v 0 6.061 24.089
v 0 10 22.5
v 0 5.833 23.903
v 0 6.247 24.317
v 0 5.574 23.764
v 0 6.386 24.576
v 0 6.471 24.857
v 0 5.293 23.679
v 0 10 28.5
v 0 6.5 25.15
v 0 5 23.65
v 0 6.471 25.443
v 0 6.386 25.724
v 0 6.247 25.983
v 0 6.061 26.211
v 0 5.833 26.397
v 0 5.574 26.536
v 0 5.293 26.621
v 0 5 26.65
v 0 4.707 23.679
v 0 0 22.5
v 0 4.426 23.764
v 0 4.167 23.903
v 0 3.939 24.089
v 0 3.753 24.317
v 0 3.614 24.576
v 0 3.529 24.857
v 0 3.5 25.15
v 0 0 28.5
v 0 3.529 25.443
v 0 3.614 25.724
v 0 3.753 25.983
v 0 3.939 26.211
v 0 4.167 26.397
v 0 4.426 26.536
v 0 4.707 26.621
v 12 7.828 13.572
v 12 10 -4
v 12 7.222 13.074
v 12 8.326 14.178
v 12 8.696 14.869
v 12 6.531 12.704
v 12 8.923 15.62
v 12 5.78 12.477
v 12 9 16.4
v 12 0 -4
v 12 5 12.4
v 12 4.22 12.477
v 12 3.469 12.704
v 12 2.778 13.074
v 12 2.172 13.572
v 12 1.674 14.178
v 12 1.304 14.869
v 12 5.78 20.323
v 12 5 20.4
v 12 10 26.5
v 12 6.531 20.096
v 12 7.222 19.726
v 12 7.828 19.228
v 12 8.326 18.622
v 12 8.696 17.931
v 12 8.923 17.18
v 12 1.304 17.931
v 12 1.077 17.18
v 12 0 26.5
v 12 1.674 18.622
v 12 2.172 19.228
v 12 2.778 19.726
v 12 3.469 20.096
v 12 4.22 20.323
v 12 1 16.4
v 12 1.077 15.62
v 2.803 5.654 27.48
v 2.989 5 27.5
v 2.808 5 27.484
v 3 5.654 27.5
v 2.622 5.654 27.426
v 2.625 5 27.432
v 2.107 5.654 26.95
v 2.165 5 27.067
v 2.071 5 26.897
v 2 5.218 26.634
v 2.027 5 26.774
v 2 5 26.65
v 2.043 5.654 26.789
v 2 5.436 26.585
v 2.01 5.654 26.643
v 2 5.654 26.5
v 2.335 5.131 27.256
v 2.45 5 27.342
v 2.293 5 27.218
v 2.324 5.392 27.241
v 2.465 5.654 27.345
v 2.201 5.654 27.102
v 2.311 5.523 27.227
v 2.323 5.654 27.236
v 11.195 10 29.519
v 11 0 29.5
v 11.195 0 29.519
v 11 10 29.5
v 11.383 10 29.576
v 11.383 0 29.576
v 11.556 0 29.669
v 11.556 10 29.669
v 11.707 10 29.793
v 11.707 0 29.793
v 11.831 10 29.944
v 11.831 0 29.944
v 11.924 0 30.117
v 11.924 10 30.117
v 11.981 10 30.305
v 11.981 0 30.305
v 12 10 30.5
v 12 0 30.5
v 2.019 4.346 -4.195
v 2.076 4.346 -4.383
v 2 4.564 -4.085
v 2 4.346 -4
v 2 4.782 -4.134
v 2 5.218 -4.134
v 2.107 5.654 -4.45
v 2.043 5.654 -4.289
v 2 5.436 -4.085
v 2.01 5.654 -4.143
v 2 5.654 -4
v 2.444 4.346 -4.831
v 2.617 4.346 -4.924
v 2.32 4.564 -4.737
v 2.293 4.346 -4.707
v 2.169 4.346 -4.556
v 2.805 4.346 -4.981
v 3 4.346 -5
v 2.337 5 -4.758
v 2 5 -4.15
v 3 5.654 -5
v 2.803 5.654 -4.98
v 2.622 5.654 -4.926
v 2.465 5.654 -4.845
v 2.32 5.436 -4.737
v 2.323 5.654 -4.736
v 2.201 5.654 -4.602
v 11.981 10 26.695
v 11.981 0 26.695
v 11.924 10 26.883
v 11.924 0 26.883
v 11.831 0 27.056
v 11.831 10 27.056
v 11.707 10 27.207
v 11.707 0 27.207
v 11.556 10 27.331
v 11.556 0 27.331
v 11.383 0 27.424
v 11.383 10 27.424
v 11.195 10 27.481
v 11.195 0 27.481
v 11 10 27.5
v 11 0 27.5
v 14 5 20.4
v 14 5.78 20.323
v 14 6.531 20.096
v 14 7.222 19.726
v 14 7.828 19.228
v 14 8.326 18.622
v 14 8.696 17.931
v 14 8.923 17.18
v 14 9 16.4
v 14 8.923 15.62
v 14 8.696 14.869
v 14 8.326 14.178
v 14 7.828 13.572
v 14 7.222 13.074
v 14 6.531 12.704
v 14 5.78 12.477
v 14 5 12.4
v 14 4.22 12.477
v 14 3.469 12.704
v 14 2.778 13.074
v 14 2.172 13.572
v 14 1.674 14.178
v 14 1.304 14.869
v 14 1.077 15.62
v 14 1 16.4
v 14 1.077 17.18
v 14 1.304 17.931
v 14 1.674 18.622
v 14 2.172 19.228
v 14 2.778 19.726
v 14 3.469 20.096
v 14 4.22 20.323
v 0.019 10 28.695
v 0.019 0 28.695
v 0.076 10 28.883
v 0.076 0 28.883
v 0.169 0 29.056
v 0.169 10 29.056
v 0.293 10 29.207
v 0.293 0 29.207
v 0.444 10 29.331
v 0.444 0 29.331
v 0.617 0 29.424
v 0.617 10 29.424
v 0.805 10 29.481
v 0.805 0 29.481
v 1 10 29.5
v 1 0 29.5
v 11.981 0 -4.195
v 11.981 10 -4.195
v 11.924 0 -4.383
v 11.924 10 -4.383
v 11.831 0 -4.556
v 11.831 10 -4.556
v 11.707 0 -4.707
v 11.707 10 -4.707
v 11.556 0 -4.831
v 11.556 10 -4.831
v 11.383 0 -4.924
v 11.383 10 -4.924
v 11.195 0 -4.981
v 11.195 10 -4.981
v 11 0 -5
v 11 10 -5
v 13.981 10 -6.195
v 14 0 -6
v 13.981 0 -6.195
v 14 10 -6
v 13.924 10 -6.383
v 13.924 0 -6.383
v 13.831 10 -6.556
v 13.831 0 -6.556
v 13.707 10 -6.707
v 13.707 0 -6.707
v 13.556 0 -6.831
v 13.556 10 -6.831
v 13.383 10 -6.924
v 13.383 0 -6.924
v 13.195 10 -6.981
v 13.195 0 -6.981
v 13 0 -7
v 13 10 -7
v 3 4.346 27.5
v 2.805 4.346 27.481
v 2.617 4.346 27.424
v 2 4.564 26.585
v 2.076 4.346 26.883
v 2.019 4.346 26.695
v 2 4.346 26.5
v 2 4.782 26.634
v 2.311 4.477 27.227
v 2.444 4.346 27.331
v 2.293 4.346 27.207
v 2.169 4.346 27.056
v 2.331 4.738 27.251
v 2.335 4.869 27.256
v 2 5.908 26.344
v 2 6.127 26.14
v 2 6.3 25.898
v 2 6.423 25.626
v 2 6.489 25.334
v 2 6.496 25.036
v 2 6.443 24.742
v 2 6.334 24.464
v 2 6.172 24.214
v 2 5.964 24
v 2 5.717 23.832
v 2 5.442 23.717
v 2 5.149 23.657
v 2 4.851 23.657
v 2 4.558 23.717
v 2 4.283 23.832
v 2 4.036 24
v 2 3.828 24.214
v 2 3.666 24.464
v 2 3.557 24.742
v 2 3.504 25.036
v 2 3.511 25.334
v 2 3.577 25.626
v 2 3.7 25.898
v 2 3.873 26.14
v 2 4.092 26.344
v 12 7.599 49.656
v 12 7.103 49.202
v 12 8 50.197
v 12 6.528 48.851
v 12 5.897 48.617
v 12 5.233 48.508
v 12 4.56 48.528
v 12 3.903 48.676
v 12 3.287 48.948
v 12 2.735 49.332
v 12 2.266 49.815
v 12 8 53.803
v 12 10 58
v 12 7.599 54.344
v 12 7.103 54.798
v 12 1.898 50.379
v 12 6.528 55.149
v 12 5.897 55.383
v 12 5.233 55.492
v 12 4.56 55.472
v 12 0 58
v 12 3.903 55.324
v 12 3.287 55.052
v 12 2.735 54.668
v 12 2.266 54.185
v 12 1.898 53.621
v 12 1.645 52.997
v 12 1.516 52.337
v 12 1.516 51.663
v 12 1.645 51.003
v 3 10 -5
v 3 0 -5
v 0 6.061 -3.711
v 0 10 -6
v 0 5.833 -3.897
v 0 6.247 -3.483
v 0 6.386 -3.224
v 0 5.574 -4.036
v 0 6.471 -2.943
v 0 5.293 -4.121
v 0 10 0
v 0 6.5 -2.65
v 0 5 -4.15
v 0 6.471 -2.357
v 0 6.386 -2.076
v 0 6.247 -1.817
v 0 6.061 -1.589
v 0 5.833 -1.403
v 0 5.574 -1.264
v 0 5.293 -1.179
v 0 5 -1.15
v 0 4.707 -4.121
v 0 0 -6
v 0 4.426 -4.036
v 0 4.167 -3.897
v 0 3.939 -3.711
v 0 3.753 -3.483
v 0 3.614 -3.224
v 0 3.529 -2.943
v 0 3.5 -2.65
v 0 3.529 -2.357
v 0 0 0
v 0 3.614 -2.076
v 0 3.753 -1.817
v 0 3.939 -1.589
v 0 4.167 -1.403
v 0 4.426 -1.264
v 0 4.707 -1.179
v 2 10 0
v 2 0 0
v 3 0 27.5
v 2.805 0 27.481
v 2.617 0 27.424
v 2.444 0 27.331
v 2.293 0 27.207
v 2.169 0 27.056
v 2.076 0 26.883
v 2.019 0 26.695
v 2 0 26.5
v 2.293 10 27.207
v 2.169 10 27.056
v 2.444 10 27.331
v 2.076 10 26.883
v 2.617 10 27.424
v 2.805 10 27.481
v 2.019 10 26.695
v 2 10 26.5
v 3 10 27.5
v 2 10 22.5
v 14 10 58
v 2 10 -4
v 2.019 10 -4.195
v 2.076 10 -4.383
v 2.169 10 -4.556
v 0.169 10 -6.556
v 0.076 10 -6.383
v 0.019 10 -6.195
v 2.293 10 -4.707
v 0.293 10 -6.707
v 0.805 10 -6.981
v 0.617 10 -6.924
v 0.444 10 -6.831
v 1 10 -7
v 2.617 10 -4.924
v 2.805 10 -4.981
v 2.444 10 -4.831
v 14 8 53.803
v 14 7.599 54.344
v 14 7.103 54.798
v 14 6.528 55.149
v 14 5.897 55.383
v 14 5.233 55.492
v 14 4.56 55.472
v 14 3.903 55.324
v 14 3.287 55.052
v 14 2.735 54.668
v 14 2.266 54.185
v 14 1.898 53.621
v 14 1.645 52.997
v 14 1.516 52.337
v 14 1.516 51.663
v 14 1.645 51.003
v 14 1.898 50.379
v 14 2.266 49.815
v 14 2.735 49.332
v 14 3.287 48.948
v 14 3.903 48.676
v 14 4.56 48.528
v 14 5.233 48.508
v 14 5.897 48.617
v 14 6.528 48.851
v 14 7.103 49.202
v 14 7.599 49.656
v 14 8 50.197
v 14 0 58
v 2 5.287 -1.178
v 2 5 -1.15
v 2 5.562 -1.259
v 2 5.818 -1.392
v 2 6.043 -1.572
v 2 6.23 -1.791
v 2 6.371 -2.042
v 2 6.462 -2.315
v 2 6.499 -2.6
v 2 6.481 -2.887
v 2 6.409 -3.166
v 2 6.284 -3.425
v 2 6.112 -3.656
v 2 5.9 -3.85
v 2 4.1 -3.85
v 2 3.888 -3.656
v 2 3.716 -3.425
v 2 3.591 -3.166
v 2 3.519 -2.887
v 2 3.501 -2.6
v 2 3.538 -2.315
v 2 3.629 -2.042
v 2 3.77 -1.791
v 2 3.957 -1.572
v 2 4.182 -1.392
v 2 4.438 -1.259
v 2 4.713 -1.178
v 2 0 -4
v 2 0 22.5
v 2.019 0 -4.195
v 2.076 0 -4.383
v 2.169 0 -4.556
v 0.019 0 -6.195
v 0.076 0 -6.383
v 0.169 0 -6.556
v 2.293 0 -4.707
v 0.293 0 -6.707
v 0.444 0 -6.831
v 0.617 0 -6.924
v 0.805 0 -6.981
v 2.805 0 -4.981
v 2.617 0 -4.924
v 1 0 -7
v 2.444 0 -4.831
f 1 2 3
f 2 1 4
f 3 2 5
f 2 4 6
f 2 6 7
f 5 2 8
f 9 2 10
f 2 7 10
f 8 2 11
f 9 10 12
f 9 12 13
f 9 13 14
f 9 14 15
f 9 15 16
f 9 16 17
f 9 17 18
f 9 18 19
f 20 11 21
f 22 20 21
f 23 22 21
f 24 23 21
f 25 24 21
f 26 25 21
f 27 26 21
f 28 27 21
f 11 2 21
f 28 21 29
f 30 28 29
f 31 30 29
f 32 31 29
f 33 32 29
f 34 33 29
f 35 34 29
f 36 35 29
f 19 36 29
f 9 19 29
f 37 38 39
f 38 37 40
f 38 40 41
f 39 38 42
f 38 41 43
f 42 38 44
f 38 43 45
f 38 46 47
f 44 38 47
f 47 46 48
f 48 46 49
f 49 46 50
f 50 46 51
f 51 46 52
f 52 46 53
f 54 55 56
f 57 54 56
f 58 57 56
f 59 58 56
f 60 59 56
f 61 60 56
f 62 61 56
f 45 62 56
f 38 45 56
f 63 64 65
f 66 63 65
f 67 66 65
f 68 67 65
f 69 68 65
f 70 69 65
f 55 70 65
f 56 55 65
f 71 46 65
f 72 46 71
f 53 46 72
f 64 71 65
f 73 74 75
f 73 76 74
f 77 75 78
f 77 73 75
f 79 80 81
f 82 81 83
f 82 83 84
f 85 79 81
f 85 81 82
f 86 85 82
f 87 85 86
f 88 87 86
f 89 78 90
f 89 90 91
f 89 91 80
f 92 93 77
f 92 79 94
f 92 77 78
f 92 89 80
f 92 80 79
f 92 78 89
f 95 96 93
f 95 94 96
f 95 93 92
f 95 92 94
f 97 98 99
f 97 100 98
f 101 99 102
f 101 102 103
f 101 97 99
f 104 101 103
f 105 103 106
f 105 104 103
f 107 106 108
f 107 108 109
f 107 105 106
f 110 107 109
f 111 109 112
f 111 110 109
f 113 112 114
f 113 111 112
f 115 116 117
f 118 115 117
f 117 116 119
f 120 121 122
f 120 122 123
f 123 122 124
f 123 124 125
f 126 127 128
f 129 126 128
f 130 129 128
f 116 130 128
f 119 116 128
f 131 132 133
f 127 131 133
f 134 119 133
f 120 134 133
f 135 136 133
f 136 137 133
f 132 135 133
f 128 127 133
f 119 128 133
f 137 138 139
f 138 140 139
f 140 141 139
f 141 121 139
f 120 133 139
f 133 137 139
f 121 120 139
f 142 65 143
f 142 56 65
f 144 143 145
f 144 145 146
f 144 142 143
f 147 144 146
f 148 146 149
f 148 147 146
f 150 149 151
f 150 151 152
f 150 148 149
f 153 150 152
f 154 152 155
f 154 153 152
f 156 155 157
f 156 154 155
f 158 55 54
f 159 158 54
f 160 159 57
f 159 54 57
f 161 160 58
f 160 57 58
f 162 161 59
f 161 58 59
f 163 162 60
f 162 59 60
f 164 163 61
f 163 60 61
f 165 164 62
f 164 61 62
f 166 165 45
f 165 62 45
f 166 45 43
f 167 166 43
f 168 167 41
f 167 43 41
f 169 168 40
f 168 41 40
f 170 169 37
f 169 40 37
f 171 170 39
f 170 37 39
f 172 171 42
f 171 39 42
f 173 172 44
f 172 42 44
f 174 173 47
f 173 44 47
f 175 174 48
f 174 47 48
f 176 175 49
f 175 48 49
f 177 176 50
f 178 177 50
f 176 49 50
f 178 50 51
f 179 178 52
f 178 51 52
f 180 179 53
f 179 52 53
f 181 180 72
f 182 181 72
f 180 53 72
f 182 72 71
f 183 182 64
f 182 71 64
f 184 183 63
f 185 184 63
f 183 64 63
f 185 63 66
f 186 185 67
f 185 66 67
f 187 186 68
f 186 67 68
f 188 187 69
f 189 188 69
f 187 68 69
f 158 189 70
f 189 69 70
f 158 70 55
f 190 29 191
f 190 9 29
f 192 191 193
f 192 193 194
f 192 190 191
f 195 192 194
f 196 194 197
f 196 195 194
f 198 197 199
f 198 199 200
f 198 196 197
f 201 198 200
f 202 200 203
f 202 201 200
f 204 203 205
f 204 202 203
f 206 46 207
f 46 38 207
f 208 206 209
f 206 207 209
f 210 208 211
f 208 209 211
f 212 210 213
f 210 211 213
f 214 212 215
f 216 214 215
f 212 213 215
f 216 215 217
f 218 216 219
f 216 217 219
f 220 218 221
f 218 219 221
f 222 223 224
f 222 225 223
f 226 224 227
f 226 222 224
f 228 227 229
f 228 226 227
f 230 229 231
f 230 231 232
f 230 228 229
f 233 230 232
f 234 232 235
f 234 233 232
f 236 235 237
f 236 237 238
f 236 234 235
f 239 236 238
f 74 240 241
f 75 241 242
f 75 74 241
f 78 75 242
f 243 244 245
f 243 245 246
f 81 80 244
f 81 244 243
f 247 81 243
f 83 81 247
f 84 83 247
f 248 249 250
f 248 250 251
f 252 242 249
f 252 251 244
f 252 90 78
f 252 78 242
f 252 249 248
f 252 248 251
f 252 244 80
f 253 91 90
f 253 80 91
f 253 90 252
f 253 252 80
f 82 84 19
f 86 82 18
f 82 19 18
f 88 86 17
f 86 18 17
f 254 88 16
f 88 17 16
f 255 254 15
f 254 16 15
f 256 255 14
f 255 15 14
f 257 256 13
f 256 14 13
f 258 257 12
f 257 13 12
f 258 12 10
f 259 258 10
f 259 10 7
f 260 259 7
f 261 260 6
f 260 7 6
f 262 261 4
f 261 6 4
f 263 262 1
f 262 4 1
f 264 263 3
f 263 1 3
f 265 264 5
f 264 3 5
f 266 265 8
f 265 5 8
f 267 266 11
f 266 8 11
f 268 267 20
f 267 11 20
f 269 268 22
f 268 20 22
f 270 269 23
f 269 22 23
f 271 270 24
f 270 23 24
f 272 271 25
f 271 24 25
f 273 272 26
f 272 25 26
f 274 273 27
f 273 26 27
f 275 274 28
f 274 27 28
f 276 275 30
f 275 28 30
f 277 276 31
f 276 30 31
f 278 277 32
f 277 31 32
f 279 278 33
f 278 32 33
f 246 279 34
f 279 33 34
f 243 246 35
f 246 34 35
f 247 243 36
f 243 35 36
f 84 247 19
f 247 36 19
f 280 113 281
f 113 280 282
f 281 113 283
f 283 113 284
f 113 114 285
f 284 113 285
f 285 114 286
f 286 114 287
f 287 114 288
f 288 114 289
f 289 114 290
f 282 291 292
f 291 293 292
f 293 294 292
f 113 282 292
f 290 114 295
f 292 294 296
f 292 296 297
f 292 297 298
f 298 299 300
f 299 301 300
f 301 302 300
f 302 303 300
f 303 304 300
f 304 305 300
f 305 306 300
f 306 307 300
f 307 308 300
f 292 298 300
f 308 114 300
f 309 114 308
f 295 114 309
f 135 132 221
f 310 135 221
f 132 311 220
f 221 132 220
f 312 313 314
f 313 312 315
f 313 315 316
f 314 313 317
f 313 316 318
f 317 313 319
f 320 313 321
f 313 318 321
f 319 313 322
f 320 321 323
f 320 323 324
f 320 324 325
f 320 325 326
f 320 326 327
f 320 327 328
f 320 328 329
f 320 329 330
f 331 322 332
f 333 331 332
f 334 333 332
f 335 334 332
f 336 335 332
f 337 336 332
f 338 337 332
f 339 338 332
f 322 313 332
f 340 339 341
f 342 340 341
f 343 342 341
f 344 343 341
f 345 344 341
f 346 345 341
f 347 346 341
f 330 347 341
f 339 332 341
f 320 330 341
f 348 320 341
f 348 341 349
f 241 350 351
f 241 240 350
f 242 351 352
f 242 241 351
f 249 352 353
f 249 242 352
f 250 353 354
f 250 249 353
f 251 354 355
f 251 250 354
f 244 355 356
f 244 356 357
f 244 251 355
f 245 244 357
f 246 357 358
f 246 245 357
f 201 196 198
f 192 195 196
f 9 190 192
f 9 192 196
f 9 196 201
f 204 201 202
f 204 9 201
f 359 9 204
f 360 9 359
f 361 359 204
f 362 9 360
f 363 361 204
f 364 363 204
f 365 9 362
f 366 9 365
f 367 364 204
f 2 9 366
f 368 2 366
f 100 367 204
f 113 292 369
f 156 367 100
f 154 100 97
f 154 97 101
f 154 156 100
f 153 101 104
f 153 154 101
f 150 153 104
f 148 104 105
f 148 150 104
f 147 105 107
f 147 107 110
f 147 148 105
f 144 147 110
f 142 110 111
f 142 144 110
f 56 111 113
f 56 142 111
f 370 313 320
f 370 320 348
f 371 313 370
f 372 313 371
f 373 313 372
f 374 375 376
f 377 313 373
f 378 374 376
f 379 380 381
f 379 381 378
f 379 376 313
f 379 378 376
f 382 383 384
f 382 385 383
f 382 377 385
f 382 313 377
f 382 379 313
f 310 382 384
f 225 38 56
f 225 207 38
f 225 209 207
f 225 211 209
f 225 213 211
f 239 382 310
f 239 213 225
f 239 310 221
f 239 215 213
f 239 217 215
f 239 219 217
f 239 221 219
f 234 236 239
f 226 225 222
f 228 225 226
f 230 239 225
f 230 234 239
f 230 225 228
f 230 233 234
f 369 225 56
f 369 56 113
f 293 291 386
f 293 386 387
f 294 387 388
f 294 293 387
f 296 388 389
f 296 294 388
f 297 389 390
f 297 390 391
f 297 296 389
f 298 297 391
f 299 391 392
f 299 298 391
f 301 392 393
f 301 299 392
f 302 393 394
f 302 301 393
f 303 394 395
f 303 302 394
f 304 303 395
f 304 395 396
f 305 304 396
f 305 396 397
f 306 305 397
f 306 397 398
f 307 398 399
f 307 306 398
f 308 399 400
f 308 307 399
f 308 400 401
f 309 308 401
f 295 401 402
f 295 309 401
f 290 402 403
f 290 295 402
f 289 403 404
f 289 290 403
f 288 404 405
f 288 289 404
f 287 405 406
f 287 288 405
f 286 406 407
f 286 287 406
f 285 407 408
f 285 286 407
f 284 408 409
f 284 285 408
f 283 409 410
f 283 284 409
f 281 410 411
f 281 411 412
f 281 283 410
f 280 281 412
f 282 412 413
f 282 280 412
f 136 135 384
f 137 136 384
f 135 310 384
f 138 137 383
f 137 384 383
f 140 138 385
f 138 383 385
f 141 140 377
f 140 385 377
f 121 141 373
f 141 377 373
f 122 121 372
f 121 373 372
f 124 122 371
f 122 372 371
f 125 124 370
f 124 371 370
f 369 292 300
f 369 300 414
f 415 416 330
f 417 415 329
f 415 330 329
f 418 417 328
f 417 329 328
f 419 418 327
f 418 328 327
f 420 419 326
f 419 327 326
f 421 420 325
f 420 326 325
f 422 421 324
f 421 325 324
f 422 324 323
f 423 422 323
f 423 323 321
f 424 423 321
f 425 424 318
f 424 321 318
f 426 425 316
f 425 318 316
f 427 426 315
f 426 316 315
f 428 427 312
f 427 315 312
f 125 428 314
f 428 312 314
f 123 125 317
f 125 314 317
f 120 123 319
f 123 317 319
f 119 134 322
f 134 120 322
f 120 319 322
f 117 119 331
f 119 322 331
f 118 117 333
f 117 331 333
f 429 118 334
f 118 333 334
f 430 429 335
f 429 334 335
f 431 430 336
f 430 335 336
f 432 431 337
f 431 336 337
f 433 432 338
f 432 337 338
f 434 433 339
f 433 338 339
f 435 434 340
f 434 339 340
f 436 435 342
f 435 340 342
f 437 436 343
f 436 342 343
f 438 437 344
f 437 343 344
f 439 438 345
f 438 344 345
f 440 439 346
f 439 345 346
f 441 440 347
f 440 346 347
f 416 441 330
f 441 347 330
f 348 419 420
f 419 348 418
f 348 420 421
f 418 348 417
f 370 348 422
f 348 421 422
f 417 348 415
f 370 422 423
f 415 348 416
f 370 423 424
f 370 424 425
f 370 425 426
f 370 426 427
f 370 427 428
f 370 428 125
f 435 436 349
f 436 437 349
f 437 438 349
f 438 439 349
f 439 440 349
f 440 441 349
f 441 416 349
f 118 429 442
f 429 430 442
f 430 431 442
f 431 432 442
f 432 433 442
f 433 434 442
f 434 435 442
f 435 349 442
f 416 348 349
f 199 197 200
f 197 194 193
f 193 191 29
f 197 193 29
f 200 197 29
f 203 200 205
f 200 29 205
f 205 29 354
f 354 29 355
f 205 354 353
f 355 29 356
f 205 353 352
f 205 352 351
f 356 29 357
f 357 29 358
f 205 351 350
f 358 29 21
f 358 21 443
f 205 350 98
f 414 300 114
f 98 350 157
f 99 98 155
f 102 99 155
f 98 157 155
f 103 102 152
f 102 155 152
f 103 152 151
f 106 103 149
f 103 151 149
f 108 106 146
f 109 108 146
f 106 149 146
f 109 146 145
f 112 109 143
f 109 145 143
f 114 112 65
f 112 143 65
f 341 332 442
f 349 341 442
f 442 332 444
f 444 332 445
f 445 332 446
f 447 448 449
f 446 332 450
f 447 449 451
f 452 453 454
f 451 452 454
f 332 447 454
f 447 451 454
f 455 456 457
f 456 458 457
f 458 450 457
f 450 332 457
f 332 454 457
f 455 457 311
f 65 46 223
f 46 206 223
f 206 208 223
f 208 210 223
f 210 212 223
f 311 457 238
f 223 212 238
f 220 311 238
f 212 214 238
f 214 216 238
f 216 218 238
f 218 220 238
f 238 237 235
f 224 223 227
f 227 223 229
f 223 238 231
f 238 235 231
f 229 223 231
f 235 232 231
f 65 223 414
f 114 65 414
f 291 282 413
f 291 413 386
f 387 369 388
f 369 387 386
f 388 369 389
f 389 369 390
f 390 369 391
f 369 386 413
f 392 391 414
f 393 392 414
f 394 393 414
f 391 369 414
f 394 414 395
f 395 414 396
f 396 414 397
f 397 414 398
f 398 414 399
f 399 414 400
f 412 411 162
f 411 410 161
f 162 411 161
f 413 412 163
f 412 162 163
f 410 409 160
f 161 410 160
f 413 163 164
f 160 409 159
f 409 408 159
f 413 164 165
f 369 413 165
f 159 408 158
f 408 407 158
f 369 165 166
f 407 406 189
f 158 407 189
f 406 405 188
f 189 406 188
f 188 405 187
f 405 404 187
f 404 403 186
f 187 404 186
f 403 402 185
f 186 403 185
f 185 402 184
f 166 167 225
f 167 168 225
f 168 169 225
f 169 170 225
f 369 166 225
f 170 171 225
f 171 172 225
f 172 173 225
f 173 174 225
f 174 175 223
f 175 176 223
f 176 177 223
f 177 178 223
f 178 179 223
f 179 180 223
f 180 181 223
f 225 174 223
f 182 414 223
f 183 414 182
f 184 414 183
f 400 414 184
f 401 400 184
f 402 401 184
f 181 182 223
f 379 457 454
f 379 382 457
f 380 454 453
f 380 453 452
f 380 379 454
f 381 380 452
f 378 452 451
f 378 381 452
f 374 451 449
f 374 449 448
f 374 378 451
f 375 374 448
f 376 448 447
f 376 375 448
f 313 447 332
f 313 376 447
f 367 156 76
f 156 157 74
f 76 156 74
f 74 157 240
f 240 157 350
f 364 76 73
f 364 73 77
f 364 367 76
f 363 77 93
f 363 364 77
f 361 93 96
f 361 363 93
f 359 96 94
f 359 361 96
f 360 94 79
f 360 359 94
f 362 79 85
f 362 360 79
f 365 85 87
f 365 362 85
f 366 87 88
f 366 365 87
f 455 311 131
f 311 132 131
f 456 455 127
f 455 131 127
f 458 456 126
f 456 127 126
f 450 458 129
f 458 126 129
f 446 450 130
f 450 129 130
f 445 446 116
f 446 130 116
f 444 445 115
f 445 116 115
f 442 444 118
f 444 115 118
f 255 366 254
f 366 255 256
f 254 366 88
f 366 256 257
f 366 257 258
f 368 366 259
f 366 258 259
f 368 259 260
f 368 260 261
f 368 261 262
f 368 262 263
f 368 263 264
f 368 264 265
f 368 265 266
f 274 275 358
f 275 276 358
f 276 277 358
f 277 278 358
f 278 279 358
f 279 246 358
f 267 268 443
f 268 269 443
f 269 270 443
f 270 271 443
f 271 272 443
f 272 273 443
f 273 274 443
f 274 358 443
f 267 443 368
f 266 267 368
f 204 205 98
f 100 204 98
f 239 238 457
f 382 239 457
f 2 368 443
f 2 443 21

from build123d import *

# Parameters (mm, degrees)
BOSS_EXTRUDE1_DEPTH = 10
SKETCH2_R           = 1.5
CUT_EXTRUDE1_DEPTH  = 2
SKETCH3_R           = 4
CUT_EXTRUDE2_DEPTH  = 2
FILLET1_R           = 1


with BuildPart() as part:
    # Sketch1 → Boss-Extrude1 (new body)
    with BuildSketch(Plane(origin=(0, 0, 0), x_dir=(1, 0, 0), z_dir=(0, 1, 0))):
        Polygon((12, 5), (12, -27.5), (2, -27.5), (2, -22.5), (0, -22.5), (0, -29.5), (12, -29.5), (12, -58), (14, -58), (14, 7), (0, 7), (0, 0), (2, 0), (2, 5), align=None)
    extrude(amount=BOSS_EXTRUDE1_DEPTH)

    # Sketch2 → Cut-Extrude1 (cut)
    with BuildSketch(Plane.ZY):
        with Locations((25.15, 5)):
            Circle(SKETCH2_R)
        with Locations((-2.65, 5)):
            Circle(SKETCH2_R)
    extrude(amount=-CUT_EXTRUDE1_DEPTH, mode=Mode.SUBTRACT)

    # Sketch3 → Cut-Extrude2 (cut)
    with BuildSketch(Plane.ZY.offset(-12)):
        with Locations((16.4, 5)):
            Circle(SKETCH3_R)
        with BuildLine():
            Line((50.197224362, 8), (53.802775638, 8))
            ThreePointArc((53.802775638, 8), (52, 1.5), (50.197224362, 8))
        make_face()
    extrude(amount=-CUT_EXTRUDE2_DEPTH, mode=Mode.SUBTRACT)

    # Fillet1
    fillet1_edges = [part.edges().sort_by_distance(p)[0] for p in [
        (2, 5, 27.5),
        (12, 5, 27.5),
        (12, 5, -5),
        (2, 5, -5),
        (0, 5, -7),
        (14, 5, -7),
        (12, 5, 29.5),
        (0, 5, 29.5),
    ]]
    fillet(fillet1_edges, radius=FILLET1_R)


solid = part.part
